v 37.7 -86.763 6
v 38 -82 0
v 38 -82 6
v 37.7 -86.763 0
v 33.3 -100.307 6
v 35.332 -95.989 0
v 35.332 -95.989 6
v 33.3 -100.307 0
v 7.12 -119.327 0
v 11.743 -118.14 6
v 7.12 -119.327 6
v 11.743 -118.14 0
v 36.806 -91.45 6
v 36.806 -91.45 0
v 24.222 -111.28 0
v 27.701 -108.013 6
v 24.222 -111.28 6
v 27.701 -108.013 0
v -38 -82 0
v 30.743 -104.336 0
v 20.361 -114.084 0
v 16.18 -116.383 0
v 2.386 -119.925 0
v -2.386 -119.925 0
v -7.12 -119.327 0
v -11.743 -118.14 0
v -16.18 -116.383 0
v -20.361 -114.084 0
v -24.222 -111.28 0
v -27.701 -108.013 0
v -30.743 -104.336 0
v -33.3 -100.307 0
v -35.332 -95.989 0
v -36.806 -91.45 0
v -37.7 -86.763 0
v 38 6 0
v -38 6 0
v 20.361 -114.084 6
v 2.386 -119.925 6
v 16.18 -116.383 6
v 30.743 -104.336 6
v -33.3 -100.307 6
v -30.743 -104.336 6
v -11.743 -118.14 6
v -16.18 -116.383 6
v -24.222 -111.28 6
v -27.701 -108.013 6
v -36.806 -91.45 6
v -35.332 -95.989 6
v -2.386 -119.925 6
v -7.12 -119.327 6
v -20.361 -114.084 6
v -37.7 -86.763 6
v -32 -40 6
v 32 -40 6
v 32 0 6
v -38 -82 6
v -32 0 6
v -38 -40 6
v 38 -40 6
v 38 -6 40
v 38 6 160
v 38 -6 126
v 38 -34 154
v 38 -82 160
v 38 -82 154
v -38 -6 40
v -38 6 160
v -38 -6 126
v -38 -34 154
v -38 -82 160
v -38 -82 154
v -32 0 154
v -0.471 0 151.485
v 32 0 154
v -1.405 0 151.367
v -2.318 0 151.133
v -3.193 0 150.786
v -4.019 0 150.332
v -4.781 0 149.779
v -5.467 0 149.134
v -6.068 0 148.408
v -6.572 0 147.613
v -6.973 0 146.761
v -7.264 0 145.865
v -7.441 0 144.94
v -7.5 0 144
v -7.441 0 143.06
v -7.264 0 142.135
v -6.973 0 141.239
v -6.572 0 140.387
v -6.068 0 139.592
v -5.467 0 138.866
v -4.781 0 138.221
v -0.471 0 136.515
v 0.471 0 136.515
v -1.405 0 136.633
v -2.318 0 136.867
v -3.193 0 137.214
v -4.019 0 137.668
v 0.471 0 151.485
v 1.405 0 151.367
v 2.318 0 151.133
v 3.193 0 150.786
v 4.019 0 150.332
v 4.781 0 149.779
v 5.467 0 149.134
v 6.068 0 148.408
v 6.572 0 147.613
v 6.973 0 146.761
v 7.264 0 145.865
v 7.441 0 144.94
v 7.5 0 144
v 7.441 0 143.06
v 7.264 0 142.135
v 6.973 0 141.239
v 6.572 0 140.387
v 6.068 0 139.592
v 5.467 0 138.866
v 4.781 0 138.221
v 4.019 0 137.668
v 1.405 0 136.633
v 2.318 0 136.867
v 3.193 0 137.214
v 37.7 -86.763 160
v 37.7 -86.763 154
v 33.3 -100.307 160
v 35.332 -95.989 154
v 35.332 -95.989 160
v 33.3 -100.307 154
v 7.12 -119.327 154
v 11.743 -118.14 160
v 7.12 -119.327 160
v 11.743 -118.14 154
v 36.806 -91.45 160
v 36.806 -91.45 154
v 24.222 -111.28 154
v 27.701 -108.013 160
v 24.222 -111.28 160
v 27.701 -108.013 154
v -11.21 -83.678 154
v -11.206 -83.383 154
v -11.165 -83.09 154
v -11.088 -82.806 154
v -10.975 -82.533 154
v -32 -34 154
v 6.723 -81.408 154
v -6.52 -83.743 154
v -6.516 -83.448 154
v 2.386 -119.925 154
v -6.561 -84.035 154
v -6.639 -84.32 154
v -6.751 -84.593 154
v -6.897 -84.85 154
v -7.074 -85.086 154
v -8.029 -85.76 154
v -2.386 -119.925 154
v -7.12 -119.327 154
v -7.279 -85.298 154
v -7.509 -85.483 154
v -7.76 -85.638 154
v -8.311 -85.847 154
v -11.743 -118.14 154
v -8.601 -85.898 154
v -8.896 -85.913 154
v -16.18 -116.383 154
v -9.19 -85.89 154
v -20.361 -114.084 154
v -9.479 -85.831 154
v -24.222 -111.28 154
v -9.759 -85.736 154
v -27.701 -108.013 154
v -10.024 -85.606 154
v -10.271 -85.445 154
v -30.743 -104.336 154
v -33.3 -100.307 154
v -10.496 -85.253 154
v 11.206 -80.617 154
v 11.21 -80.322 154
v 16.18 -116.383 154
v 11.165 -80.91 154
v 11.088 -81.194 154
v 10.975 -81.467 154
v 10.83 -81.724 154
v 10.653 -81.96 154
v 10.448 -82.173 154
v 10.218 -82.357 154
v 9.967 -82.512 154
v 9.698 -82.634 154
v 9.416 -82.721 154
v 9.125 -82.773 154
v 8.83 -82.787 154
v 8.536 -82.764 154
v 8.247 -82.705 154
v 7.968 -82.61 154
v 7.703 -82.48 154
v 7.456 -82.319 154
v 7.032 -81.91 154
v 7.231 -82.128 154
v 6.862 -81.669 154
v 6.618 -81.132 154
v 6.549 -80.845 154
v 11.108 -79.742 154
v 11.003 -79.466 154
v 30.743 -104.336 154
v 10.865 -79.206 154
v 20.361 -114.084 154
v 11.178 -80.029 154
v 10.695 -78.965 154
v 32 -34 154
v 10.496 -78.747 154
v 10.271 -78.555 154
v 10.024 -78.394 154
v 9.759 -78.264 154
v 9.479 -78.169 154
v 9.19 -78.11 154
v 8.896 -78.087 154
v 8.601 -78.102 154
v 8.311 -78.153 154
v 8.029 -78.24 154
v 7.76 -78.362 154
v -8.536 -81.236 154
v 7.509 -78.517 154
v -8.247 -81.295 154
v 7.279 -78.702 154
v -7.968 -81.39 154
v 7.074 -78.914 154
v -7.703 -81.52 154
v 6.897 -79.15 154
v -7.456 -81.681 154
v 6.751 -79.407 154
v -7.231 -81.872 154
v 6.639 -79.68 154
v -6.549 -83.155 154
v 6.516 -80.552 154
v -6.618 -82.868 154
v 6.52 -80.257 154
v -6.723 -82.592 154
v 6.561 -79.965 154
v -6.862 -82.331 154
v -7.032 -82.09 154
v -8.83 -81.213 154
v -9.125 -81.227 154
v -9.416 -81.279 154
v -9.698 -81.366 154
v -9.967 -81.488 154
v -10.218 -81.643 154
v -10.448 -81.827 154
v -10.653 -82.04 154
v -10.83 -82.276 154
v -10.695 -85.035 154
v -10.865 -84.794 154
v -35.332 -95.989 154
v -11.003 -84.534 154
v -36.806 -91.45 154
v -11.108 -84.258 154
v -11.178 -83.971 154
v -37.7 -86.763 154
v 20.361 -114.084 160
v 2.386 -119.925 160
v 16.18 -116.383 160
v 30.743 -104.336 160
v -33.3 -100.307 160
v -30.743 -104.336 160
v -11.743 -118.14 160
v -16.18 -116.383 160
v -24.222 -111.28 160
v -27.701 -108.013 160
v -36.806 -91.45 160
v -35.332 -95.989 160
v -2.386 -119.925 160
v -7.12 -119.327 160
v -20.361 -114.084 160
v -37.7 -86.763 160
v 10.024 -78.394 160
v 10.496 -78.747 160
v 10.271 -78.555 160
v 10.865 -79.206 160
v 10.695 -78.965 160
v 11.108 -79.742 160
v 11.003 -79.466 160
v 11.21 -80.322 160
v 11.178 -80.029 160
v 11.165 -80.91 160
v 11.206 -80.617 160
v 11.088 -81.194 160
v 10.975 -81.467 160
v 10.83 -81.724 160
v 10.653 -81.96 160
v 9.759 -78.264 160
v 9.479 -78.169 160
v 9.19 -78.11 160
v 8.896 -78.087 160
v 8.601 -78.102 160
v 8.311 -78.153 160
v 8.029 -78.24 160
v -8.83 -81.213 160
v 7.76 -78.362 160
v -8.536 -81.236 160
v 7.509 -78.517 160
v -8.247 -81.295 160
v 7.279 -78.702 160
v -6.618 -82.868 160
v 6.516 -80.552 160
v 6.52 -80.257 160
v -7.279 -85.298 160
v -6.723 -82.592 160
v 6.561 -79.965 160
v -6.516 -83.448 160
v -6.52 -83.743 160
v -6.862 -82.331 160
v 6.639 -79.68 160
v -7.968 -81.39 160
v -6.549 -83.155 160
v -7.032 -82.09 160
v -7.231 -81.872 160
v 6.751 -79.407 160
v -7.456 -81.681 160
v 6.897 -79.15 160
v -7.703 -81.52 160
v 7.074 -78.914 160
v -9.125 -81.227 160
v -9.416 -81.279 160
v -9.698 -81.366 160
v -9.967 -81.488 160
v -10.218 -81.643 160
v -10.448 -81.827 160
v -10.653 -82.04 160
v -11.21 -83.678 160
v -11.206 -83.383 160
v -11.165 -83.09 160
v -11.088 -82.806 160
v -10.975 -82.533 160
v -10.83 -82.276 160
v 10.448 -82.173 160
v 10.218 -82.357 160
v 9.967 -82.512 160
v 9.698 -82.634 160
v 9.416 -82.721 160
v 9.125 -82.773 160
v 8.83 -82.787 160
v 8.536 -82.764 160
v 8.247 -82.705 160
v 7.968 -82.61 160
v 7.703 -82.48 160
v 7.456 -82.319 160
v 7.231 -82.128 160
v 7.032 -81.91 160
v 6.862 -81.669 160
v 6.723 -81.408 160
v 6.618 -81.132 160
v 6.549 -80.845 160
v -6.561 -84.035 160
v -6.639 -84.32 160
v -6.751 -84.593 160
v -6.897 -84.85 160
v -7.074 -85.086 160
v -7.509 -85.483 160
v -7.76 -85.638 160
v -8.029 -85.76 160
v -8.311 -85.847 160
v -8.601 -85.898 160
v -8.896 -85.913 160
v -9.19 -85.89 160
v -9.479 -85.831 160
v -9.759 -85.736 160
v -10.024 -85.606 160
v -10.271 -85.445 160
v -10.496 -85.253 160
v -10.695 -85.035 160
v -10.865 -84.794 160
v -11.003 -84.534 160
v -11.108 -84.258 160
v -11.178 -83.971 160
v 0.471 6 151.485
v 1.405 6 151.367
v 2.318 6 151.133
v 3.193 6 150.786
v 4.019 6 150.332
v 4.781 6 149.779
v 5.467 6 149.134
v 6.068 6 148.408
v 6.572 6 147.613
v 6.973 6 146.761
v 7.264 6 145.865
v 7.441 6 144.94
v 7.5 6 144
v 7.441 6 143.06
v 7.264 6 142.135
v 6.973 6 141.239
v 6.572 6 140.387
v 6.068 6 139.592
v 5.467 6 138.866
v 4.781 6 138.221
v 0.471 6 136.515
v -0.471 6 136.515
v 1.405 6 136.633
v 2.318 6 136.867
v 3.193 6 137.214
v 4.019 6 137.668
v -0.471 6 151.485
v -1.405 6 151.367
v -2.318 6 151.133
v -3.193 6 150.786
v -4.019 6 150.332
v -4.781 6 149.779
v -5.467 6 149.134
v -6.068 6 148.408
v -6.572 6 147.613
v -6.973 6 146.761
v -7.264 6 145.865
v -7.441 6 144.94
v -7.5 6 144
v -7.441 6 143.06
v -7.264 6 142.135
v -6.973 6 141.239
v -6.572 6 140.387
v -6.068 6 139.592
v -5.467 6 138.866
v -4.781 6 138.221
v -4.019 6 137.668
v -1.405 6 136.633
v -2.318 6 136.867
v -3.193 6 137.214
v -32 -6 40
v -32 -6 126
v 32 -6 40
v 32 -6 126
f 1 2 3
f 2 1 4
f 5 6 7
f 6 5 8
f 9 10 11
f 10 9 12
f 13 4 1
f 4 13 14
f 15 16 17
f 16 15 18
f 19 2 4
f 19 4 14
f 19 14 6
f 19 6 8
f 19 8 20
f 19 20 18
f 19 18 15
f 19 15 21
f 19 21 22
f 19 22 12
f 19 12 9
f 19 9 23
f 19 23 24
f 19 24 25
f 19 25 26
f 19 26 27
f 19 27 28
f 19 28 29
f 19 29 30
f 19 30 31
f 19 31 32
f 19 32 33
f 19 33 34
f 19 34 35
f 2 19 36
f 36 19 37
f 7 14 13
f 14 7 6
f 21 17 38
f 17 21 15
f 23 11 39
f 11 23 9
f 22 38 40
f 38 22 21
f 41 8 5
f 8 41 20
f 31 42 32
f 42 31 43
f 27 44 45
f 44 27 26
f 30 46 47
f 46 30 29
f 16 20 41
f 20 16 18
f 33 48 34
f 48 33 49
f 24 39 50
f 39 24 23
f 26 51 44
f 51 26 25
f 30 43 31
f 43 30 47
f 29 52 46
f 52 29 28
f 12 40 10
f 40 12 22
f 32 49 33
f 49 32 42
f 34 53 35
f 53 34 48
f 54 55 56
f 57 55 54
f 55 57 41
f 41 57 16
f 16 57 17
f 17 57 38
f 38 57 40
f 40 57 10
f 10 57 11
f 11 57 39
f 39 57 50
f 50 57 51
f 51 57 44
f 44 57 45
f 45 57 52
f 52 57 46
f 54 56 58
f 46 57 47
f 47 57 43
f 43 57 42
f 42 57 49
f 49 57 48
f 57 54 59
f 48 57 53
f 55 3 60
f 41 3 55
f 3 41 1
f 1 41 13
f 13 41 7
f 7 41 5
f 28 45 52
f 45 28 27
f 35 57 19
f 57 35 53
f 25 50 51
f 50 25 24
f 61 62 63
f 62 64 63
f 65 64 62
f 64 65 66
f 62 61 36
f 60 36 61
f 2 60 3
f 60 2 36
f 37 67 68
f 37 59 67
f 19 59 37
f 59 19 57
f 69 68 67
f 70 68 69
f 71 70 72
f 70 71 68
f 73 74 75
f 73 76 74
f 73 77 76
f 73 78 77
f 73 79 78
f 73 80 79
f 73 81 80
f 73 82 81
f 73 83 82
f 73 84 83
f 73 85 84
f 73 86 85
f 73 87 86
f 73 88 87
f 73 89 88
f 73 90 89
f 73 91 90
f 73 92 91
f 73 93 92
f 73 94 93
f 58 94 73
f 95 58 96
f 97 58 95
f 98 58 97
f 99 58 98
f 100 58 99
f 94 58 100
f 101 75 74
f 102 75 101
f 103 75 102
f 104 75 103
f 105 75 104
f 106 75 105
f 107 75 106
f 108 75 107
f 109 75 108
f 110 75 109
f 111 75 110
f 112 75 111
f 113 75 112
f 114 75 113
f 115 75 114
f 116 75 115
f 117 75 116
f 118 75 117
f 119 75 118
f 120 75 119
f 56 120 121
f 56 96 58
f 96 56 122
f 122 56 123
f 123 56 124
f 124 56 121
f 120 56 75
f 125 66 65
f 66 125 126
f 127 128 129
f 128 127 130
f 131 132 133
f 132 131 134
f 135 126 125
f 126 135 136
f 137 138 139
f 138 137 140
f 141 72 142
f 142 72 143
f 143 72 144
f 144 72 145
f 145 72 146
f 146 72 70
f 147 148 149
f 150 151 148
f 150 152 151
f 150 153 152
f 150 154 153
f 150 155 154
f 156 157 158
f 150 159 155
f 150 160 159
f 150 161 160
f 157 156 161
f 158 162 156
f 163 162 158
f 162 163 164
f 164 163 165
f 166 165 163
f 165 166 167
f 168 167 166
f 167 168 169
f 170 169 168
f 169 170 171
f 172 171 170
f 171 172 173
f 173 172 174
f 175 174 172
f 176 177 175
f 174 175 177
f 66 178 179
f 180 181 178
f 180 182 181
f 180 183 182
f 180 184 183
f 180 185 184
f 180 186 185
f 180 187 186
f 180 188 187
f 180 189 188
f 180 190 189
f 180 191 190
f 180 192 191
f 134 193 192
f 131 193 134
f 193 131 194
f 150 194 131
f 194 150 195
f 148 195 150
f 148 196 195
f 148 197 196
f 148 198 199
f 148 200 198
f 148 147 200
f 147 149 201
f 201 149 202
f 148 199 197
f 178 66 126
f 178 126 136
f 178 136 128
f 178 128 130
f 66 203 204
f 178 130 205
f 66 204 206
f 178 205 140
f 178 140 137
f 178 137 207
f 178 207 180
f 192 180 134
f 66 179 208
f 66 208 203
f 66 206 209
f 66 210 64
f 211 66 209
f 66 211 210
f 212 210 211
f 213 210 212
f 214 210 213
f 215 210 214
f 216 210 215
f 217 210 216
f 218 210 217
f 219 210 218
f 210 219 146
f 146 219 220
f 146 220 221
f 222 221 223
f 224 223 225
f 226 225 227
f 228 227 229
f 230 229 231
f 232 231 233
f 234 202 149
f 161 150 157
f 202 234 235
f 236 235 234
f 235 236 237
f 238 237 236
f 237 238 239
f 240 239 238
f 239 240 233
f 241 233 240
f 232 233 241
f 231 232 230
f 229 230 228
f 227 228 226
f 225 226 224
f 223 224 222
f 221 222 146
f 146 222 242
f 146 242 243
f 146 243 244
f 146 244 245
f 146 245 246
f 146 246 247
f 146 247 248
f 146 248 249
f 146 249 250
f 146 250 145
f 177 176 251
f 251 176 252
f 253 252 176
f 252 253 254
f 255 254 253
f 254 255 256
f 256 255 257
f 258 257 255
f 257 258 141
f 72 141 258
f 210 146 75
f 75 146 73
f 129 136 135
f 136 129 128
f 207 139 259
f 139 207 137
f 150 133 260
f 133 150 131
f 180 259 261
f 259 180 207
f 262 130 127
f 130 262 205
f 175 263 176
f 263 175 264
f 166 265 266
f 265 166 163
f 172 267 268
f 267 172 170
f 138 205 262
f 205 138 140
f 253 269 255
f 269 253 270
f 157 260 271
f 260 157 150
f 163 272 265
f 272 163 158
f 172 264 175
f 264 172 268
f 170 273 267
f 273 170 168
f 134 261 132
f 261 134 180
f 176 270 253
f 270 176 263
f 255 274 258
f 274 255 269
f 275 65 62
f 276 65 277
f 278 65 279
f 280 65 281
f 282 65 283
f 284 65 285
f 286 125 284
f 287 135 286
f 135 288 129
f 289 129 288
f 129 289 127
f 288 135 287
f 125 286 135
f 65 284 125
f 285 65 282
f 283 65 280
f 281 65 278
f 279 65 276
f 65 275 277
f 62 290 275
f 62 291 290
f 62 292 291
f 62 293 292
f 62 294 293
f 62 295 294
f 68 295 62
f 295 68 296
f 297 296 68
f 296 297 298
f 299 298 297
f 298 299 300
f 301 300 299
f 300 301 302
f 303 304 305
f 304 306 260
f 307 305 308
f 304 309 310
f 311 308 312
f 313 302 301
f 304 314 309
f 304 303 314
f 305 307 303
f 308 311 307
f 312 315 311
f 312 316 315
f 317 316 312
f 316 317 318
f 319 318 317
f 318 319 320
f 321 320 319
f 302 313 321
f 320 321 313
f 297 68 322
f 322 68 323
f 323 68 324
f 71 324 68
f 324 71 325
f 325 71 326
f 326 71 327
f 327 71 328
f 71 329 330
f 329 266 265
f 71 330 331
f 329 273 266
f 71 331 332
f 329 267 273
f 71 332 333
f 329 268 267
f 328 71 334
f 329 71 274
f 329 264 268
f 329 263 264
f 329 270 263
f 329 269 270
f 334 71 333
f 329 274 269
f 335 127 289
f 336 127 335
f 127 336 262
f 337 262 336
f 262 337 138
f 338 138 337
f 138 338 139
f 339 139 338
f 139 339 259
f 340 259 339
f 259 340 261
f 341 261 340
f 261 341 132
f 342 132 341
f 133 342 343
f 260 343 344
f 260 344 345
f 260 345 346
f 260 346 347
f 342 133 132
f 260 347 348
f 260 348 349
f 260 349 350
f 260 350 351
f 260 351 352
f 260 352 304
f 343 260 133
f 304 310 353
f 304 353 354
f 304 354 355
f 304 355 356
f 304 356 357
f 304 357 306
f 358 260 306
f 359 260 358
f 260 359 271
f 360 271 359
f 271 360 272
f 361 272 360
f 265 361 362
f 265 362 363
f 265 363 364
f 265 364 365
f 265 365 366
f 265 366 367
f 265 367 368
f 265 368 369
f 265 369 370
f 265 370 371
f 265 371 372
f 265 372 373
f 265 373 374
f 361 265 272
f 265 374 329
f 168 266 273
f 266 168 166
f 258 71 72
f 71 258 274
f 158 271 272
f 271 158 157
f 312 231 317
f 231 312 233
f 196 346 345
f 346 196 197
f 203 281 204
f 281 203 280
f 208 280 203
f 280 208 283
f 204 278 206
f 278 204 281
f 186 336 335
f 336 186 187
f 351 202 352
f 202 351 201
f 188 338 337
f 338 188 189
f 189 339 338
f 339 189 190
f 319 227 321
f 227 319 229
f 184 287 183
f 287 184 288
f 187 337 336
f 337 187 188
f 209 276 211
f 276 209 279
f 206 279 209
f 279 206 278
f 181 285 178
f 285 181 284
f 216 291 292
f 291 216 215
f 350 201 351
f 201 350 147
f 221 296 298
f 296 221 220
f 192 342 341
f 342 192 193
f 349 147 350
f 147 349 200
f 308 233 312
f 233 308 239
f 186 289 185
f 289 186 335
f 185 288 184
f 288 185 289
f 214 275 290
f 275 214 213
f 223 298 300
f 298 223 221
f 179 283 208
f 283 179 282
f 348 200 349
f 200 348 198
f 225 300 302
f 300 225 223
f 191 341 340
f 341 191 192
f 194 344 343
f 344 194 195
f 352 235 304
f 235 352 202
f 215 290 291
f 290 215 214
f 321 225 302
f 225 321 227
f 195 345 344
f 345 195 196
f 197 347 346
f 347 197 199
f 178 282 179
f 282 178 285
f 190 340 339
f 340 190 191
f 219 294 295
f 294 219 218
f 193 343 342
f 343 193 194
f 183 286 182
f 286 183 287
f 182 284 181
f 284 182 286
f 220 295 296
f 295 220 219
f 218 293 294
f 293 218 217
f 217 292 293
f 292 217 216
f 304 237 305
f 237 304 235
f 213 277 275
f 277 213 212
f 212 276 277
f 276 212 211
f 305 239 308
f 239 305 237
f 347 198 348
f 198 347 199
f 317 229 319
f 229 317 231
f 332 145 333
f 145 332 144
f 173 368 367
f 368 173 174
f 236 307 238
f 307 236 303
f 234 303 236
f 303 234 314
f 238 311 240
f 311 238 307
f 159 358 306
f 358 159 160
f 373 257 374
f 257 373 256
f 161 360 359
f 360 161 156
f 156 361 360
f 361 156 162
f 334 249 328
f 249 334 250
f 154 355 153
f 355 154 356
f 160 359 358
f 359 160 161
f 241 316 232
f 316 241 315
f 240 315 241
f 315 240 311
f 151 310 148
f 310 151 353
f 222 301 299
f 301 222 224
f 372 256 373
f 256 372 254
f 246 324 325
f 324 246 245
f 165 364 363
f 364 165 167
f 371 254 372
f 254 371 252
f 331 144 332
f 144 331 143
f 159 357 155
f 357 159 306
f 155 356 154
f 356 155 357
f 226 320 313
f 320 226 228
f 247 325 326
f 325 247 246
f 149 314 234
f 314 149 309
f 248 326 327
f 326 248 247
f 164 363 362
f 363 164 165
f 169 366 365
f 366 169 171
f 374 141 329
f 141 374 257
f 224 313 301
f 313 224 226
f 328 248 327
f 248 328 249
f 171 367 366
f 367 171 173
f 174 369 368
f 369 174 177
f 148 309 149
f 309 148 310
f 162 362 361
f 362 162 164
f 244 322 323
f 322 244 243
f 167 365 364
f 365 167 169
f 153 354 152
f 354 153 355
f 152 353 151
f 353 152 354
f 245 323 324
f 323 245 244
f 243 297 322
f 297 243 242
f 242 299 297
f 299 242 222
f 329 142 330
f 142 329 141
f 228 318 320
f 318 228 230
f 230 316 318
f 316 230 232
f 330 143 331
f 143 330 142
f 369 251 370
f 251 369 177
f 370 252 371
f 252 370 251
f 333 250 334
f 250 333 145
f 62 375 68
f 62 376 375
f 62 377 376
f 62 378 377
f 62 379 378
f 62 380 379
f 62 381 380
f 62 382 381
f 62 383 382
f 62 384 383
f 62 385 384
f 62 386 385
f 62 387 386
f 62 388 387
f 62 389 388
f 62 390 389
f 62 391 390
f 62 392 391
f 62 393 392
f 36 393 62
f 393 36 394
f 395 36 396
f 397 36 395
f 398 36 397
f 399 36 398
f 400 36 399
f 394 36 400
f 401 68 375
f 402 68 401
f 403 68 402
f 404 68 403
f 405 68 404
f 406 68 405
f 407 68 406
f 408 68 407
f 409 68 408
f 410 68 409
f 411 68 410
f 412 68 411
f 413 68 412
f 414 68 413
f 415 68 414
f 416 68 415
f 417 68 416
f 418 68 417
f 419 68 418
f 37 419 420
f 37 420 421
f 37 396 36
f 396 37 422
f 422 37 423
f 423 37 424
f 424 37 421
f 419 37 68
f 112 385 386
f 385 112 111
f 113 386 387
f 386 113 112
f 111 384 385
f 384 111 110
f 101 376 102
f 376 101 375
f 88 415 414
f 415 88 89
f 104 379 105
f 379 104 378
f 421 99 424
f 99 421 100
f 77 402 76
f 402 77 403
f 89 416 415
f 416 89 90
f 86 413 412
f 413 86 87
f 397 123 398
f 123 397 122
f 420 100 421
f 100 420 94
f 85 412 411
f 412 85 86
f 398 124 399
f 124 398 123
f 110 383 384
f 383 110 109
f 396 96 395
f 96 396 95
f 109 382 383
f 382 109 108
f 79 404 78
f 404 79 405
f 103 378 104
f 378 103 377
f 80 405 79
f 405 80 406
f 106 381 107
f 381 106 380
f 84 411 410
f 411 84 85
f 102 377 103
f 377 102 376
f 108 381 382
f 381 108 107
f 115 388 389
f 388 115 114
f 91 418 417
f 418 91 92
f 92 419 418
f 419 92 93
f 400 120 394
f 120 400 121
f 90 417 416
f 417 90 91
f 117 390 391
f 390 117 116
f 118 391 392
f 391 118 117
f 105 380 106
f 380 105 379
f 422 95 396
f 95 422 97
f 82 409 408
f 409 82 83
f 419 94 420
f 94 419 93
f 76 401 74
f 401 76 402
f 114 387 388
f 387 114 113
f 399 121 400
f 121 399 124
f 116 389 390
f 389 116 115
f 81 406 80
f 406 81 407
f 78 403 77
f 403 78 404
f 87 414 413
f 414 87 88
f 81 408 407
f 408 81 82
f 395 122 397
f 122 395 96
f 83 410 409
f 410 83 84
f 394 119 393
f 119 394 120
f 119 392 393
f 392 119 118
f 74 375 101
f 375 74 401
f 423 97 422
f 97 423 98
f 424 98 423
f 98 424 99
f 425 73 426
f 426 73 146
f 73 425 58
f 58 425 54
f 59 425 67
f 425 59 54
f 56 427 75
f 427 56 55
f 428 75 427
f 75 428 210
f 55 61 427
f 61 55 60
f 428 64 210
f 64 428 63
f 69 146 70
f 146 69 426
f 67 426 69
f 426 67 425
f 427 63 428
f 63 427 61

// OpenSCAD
// RIOLINK E1 stand

DIA = 76;
WALL = 6;
HEIGHT = 160;
SW = 40;

ScrewDia = 4.7;

$fn = 50;

// Base
Plate();

// Top
translate([0,0,HEIGHT - WALL]) difference() {
  Plate();
  // Holes
  #translate([0,-DIA - WALL,-0.1]) rotate([0,0,10]) {
    translate([18/2,0,0]) cylinder(d=ScrewDia, h = WALL + 0.2);
    translate([-18/2,0,0]) cylinder(d=ScrewDia, h = WALL + 0.2);
  }
}

// Back
difference() {
  translate([-DIA/2,0,0]) cube([DIA, WALL, HEIGHT]);
  // Cable hole
  translate([0, WALL+0.1, HEIGHT - WALL -  10]) rotate([90,0,0]) cylinder(d=15, h=WALL+0.2);
}

// Trigs
Trig();
translate([0,0,HEIGHT+WALL]) rotate([0,180,0]) Trig();

// Support
for (x = [-DIA/2, DIA/2-WALL]) translate([x, -WALL, 0]) cube([WALL, 10, HEIGHT]);


module Trig() {
  for (x = [-DIA/2, DIA/2-WALL]) translate([x, 0, WALL])
    rotate([0,270,180]) linear_extrude(WALL) polygon([
      [0,0], [0,SW], [SW,0]
    ]);
}

module Plate() {
  translate([0,-DIA - WALL,0]) {
    cylinder(d=DIA,h=WALL);
    translate([-DIA/2,0,0]) cube([DIA, DIA + WALL, WALL]);
  }
}




//DIA = 83.5 + 0.5;
//DEPTH = 9.5;
//WALL = 3;
//HEIGHT = 40;
//ANGLE = 15;
//
//OUTER_DIA = DIA + 2 * WALL;
//
//$fn = 80;
//
//difference () {
//  union () {
//    hull() {
//      translate([0,0,HEIGHT]) Disc();
//      translate([0,0,-50]) Disc();
//    }
//    translate([0,0,HEIGHT]) Top();
//  }
//  translate([-DIA, -DIA, -200]) cube([2 * DIA, 2 * DIA, 200]);
//}
//
//module Top() {
//  rotate([0,ANGLE,0]) difference () {
//    cylinder(d=OUTER_DIA, h = DEPTH + 1);
//    translate([0,0,1 + 0.01]) cylinder(d=DIA, h = DEPTH);
//  }
//}
//
//module Disc() {
//  rotate([0,ANGLE,0]) difference () {
//    cylinder(d=OUTER_DIA, h = 0.1);
//  }
//}
